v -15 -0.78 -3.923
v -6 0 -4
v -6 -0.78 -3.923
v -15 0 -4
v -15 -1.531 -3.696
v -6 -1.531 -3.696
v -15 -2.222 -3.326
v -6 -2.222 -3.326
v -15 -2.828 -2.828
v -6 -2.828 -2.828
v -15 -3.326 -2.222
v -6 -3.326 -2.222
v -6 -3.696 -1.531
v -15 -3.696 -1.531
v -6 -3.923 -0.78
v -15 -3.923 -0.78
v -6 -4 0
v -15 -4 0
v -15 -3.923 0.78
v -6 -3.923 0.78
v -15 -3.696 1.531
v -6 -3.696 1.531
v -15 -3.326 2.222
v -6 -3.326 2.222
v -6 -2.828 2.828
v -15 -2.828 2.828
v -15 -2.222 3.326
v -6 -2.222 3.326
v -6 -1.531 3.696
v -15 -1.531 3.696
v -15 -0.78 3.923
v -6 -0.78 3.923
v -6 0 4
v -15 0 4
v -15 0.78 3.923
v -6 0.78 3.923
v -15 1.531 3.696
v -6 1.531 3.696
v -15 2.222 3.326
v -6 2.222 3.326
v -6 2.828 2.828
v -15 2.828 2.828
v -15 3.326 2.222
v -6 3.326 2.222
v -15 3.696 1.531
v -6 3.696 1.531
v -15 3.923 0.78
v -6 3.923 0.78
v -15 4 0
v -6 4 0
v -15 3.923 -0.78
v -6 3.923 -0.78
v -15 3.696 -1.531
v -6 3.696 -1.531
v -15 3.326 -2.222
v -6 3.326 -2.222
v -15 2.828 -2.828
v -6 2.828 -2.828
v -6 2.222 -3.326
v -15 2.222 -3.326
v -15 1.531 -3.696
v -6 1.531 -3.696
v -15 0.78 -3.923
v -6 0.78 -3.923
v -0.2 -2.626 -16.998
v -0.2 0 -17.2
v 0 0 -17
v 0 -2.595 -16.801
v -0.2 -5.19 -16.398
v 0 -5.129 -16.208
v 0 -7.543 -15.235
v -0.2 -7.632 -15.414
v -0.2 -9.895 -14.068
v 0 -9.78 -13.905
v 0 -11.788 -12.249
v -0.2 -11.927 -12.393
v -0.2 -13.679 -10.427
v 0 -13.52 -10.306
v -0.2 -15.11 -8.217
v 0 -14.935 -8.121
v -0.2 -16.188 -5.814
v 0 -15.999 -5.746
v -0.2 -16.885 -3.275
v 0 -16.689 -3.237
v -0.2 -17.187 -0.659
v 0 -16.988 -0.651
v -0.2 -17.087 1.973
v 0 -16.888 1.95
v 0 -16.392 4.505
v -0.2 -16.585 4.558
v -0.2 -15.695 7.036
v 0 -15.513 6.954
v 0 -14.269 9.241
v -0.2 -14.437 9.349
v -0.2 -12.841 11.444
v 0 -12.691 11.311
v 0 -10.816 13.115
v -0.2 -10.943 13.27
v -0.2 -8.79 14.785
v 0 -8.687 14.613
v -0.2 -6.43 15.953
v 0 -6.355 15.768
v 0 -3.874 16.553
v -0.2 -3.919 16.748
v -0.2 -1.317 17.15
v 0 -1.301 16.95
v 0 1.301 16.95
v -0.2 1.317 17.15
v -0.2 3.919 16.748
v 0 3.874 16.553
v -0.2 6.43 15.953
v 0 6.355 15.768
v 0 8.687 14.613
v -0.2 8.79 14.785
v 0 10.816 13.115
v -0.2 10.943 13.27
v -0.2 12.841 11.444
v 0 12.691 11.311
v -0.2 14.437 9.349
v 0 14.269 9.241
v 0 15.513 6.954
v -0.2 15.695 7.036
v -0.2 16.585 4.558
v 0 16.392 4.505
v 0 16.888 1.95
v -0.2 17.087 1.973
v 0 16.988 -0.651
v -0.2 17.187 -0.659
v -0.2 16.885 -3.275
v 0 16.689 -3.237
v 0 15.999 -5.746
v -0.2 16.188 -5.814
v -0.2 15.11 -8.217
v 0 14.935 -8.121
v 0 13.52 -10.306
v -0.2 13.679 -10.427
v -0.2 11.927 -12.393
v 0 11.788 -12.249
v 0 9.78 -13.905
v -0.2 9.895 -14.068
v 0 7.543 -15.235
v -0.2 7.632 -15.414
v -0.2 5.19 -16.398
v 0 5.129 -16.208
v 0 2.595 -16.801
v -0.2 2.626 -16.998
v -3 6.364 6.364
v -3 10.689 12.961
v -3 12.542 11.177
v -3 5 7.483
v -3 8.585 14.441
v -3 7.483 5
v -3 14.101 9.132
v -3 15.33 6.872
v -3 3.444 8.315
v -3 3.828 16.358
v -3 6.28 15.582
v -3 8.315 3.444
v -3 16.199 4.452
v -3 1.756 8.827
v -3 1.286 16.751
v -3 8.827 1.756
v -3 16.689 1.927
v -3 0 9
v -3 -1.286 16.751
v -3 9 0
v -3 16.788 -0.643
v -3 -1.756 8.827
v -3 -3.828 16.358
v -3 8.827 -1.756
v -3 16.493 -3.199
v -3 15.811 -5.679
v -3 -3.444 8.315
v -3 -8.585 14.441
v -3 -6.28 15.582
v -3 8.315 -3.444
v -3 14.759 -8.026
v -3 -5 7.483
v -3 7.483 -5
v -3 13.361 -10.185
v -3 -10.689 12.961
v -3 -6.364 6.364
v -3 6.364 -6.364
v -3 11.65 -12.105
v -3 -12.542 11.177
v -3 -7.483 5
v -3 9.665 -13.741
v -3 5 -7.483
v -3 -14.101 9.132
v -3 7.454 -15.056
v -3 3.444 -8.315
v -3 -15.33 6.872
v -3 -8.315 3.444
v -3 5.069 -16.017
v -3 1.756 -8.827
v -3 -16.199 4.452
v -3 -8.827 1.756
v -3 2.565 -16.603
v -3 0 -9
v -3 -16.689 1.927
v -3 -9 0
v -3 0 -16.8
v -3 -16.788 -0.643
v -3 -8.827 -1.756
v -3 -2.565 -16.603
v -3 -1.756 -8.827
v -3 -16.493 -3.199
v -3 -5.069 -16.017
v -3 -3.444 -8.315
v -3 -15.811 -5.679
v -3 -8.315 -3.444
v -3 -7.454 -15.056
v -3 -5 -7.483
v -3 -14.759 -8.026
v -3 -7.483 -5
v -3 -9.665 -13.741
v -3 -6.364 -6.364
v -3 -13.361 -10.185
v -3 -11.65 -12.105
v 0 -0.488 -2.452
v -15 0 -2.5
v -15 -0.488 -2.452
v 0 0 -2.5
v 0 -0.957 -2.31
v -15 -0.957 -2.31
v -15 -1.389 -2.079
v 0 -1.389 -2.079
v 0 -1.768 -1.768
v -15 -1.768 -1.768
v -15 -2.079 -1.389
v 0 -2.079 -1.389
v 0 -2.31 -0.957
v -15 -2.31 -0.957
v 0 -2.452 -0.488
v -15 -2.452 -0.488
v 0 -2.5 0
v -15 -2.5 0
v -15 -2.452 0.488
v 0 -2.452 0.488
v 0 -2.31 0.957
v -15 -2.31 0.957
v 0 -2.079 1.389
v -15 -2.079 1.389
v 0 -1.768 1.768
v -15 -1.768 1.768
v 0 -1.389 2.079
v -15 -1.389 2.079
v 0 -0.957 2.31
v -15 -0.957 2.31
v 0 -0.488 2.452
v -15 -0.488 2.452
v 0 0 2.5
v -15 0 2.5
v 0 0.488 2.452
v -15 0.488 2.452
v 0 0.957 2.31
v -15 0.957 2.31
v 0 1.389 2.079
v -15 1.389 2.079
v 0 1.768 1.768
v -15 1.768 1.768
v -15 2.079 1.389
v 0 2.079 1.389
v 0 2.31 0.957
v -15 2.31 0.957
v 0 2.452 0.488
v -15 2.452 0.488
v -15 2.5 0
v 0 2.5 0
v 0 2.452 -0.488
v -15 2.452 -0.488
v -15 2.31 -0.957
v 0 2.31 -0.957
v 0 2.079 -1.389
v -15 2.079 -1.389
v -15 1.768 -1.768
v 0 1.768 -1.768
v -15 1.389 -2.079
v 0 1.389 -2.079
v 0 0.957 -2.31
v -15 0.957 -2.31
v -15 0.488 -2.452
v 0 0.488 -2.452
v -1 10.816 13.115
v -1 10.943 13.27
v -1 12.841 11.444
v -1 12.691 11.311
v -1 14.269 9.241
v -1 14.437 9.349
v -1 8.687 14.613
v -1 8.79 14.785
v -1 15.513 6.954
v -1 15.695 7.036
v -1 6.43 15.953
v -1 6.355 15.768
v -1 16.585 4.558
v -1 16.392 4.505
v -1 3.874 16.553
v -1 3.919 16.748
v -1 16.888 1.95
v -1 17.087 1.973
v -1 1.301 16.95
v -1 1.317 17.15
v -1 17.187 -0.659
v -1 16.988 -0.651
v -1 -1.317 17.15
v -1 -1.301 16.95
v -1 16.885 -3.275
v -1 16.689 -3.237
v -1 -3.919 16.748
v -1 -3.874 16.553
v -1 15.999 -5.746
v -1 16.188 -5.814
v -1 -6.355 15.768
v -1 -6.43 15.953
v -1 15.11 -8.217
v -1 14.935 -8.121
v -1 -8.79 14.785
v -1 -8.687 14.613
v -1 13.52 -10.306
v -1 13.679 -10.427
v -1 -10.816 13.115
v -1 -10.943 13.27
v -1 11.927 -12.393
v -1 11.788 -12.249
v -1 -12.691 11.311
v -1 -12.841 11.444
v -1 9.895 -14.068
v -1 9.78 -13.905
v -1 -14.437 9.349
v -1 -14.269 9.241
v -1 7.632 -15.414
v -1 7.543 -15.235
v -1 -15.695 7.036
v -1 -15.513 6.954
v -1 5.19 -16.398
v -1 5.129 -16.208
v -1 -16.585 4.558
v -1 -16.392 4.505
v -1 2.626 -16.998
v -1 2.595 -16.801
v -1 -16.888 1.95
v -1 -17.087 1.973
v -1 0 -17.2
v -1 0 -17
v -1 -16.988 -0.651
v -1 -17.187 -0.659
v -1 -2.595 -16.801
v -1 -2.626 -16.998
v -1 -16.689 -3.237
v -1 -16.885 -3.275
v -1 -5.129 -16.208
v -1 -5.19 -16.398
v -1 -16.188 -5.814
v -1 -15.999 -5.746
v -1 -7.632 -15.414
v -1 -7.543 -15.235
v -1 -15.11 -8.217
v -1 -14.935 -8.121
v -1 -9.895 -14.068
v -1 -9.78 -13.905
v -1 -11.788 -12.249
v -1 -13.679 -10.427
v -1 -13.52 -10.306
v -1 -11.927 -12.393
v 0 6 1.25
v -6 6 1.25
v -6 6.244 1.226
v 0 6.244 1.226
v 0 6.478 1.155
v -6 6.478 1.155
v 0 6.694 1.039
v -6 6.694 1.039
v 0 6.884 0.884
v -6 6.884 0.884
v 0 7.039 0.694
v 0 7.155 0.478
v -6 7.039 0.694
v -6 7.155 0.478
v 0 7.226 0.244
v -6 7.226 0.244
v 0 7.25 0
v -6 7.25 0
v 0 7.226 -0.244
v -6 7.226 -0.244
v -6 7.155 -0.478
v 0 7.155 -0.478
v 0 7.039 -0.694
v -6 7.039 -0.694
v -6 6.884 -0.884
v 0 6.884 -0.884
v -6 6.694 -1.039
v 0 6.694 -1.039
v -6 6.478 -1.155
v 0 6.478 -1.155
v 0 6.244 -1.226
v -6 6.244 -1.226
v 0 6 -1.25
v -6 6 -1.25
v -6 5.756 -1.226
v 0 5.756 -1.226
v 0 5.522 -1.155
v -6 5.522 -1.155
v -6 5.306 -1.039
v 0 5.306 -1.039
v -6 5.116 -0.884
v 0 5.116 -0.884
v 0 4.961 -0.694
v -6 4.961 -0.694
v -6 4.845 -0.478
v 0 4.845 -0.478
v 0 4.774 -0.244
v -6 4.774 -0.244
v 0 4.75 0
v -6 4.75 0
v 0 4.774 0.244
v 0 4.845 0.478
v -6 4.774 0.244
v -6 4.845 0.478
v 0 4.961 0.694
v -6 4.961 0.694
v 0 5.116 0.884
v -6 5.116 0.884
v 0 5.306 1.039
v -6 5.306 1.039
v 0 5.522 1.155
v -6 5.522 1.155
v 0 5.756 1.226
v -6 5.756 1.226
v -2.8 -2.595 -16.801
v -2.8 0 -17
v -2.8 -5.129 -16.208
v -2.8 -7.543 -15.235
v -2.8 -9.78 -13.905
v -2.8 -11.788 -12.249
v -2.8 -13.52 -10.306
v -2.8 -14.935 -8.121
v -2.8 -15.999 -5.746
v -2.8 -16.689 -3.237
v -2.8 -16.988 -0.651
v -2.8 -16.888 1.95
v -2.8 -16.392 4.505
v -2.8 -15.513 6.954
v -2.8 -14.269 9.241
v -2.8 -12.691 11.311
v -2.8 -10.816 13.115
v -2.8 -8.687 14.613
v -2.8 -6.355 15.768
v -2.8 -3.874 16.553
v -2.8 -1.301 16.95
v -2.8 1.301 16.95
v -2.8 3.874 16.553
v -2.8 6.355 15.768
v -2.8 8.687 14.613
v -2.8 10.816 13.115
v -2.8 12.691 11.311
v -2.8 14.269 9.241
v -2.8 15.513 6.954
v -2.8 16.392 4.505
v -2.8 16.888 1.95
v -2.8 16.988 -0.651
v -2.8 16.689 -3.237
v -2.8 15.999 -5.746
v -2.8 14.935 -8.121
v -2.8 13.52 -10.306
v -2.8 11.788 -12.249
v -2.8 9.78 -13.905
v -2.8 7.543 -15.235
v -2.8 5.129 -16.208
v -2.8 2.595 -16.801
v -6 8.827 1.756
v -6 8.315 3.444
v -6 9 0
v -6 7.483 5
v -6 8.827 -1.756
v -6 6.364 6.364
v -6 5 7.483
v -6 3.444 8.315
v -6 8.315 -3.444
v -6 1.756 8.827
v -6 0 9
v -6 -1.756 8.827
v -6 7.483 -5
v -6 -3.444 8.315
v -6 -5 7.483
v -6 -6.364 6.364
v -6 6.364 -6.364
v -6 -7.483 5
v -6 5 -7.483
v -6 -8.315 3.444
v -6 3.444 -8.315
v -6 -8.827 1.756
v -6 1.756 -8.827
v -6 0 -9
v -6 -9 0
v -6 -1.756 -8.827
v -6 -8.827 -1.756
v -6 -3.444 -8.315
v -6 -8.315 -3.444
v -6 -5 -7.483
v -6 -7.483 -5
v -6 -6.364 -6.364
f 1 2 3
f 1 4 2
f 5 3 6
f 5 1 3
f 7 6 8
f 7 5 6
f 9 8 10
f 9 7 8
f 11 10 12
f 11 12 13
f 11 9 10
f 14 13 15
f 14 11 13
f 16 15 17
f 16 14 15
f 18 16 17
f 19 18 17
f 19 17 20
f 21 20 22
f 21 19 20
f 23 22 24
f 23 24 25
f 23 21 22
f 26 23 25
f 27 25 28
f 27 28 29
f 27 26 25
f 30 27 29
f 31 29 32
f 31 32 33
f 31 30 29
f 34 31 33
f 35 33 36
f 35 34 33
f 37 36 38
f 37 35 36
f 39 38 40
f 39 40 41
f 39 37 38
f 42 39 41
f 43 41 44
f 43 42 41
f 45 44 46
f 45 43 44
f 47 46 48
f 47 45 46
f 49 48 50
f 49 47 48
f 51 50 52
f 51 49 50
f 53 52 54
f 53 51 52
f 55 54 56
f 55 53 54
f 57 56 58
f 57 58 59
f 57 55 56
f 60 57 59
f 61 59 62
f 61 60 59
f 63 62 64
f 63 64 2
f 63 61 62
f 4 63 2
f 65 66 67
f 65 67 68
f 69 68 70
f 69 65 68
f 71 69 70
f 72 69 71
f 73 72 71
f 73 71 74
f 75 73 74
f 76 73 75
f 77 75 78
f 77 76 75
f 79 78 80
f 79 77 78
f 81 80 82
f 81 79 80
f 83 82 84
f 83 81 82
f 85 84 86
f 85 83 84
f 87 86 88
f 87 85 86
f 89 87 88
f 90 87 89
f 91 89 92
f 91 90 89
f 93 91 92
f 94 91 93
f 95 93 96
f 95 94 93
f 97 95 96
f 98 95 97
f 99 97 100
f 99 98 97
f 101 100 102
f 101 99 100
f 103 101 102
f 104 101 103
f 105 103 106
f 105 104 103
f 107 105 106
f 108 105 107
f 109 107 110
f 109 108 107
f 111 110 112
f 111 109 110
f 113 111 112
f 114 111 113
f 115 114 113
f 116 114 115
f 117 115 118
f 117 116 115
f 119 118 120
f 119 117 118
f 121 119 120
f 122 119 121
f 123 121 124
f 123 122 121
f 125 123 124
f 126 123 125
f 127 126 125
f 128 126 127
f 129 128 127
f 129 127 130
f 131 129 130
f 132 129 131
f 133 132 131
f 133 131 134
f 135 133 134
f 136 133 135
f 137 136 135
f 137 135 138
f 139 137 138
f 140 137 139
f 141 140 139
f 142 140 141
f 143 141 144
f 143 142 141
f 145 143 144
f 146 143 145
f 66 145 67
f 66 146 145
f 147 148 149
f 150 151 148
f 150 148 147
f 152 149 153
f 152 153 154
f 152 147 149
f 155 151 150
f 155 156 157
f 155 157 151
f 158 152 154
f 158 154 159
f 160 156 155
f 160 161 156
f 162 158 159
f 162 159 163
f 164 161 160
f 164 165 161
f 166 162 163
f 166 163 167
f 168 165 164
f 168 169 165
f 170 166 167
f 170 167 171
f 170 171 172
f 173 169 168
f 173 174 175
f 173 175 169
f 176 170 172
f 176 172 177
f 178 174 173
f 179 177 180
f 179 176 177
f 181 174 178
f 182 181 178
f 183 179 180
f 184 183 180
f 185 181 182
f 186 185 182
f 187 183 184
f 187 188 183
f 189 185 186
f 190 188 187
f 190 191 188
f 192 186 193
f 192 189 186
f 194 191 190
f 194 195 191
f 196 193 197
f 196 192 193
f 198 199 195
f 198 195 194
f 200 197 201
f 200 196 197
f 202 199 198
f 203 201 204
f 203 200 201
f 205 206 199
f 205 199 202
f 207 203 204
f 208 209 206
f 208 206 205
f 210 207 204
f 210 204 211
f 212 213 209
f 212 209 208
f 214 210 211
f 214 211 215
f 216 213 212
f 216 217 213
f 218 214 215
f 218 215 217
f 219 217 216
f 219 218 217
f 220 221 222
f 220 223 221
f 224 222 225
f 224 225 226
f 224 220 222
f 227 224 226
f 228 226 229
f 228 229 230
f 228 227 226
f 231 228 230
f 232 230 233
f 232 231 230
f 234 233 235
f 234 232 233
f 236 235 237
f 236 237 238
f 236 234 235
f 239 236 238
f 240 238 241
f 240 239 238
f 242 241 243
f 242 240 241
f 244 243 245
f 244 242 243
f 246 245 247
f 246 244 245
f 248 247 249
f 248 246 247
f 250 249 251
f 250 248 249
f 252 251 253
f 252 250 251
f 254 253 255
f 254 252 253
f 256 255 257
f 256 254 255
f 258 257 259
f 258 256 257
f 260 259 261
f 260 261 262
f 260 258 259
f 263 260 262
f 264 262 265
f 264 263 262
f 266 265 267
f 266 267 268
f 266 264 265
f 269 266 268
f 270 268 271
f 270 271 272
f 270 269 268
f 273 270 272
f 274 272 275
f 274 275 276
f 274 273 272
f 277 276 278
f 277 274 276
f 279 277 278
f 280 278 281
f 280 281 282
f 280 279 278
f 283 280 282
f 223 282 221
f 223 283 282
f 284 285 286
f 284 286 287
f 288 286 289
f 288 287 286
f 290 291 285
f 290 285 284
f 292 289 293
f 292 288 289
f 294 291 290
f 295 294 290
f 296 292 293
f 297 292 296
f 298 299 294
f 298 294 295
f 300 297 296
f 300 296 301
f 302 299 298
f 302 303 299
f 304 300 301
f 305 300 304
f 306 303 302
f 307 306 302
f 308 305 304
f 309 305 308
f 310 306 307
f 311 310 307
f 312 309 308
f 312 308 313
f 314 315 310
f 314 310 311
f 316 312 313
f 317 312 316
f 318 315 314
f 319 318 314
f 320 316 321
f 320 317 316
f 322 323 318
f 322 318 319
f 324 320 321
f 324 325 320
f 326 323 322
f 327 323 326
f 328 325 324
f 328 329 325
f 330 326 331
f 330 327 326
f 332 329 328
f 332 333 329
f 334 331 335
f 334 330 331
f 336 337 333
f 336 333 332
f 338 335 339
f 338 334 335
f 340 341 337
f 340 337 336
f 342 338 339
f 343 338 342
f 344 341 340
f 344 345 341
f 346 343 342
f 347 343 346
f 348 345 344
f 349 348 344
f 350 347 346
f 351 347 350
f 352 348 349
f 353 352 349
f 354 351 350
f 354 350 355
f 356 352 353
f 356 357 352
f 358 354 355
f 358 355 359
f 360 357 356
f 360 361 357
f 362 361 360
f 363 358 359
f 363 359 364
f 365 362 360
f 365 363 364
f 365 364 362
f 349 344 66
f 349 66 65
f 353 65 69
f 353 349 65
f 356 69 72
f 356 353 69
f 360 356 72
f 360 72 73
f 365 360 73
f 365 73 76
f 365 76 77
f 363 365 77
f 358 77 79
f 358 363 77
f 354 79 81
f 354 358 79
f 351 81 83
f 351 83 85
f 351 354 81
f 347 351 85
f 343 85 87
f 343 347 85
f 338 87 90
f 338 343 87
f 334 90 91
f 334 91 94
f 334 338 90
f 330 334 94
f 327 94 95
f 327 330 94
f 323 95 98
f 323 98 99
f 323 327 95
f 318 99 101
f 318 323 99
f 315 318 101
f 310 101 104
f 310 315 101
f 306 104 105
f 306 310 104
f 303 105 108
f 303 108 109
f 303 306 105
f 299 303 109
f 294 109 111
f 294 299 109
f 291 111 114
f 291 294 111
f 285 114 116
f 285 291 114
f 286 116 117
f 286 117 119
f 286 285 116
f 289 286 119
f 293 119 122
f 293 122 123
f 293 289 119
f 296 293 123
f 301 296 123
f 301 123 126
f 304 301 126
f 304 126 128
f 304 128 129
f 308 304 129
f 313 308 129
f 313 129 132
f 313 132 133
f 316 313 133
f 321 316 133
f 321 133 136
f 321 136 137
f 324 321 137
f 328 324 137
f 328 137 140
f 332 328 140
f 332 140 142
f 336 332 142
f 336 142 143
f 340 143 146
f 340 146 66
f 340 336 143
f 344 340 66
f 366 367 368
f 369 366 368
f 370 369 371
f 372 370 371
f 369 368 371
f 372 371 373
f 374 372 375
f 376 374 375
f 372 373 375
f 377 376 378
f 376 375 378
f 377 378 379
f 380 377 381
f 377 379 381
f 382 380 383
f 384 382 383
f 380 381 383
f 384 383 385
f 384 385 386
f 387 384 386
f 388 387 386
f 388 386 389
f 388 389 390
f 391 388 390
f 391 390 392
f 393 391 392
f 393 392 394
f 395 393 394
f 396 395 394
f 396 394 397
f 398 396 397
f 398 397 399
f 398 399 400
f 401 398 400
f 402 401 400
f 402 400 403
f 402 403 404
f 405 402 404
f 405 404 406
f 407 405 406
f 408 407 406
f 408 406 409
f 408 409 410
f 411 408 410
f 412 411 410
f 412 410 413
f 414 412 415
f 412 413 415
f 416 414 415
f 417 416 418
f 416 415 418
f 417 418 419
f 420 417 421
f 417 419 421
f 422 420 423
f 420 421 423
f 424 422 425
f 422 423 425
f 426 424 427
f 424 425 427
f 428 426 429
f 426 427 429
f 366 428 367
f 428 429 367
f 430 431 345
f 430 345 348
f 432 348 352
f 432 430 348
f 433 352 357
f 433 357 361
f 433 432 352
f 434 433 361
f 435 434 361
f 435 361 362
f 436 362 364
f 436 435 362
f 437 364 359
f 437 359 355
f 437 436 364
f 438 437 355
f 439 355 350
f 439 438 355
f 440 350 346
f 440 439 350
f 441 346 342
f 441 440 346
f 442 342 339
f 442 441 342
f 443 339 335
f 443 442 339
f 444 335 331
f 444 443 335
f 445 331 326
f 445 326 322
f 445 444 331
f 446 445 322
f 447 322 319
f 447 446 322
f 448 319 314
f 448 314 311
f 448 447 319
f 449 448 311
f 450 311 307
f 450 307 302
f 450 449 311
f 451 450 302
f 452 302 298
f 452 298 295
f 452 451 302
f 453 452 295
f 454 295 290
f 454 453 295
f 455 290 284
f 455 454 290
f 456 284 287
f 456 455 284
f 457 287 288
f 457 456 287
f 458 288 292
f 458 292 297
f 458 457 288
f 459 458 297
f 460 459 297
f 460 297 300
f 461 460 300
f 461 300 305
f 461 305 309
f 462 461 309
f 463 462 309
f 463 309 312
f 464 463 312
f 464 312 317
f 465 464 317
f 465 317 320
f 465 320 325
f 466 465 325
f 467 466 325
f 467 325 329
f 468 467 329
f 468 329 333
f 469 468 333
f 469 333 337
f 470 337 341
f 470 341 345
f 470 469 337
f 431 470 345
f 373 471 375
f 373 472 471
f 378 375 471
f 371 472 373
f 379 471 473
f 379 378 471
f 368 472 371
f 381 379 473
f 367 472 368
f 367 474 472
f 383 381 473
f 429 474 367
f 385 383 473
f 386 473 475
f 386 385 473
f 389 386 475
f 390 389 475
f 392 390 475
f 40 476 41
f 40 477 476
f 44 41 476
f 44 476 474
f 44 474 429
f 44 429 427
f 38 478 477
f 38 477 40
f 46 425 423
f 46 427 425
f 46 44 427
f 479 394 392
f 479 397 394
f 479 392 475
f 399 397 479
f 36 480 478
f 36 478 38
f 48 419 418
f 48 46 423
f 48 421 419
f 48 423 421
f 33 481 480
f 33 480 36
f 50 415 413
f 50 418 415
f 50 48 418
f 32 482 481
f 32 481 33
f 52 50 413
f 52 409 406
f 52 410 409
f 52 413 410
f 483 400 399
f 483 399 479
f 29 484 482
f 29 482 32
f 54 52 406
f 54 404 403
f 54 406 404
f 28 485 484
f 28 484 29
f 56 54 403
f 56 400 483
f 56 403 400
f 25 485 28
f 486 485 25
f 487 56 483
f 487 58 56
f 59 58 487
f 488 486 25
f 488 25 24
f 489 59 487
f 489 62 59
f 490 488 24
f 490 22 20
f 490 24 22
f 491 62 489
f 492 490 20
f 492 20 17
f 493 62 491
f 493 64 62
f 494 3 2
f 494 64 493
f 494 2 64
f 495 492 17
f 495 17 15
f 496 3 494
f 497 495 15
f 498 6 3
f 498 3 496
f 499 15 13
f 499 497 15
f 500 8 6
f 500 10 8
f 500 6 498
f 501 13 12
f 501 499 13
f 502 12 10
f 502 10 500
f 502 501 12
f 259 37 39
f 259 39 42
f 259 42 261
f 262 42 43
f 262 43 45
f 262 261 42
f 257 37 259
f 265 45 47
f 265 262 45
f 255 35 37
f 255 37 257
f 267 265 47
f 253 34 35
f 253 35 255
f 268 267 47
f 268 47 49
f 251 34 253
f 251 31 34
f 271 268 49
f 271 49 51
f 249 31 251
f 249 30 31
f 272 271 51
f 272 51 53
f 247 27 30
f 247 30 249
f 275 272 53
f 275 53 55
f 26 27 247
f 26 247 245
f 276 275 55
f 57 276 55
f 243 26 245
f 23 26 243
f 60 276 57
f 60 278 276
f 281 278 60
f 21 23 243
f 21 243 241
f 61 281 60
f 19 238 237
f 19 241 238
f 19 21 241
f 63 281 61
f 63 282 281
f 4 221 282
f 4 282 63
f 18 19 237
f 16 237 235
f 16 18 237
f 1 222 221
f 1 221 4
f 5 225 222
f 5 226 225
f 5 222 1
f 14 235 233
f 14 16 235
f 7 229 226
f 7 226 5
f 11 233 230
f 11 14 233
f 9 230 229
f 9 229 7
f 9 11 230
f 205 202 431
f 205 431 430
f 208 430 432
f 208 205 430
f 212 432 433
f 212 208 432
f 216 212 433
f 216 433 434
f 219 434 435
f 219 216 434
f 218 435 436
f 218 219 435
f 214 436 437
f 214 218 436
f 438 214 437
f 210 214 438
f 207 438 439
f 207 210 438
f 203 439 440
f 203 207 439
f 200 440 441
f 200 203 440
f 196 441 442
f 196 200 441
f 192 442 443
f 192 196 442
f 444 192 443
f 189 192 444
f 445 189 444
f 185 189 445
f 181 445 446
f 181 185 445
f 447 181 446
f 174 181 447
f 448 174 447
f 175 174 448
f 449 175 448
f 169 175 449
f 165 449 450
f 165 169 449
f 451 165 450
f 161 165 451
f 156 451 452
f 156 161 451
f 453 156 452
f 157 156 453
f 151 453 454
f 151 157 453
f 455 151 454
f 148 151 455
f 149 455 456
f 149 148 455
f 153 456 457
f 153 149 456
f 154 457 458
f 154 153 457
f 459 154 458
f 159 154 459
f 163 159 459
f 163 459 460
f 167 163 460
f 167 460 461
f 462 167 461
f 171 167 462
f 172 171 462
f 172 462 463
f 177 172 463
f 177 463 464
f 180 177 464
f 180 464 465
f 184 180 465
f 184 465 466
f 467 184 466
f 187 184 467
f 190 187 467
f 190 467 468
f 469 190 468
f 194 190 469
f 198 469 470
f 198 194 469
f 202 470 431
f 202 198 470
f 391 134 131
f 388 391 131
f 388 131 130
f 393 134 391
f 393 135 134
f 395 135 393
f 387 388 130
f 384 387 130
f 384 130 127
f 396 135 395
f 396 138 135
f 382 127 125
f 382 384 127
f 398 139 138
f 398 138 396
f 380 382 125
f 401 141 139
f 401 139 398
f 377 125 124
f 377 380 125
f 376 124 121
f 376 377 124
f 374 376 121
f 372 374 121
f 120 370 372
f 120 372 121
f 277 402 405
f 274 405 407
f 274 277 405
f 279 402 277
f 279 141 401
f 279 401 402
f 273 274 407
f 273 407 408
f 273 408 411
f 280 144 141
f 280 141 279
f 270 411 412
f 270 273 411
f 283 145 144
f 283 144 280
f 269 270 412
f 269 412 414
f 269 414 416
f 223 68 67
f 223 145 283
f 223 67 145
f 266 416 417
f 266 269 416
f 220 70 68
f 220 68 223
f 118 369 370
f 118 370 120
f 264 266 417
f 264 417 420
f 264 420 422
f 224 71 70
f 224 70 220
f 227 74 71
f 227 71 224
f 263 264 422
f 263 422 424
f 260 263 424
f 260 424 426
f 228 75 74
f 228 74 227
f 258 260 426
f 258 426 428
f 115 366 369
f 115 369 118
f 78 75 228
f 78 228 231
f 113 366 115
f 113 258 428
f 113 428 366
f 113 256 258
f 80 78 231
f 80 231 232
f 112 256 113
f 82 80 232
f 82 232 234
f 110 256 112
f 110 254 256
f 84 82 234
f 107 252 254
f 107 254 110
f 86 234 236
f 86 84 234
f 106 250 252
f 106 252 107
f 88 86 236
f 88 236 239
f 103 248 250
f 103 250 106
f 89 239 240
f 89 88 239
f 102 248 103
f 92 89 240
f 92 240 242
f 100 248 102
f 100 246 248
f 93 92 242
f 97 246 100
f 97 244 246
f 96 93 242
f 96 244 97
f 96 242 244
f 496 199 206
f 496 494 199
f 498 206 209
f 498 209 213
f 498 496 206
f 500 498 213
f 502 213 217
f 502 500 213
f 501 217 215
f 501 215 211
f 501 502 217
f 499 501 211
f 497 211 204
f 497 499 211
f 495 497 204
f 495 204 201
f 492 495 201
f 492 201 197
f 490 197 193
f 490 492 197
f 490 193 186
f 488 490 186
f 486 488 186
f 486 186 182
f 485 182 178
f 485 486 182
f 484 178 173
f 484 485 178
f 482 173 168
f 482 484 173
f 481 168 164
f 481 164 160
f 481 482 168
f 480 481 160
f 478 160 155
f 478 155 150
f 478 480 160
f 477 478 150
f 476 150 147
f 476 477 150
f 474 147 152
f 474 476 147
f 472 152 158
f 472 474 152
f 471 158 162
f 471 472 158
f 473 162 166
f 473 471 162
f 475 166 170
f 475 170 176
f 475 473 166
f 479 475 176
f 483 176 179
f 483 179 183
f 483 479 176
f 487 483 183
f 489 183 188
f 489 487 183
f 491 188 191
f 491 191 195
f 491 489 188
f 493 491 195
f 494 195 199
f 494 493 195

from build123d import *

# Parameters (mm, degrees)
SKETCH2_R          = 1.25
CUT_EXTRUDE1_DEPTH = 26.936075262
CHAMFER1_SIZE      = 0.2


with BuildPart() as part:
    # Sketch1 → Revolve1 (revolve)
    with BuildSketch(Plane.XY, mode=Mode.PRIVATE) as revolve1_sk:
        Polygon((0, 2.5), (0, 17.2), (-1, 17.2), (-1, 17), (-3, 17), (-3, 9), (-6, 9), (-6, 4), (-15, 4), (-15, 2.5), align=None)
    revolve(revolve1_sk.sketch.rotate(Axis((0, 0, 0), (-1, 0, 0)), 90), axis=Axis((0, 0, 0), (-1, 0, 0)))

    # Sketch2 → Cut-Extrude1 (cut, through all)
    with BuildSketch(Plane.ZY.offset(6)):
        with Locations((0, 6)):
            Circle(SKETCH2_R)
    extrude(amount=-CUT_EXTRUDE1_DEPTH, mode=Mode.SUBTRACT)

    # Chamfer1
    chamfer1_edges = [part.edges().sort_by_distance(p)[0] for p in [
        (-3, 0, 17),
        (0, 0, 17.2),
    ]]
    chamfer(chamfer1_edges, length=CHAMFER1_SIZE)


solid = part.part
